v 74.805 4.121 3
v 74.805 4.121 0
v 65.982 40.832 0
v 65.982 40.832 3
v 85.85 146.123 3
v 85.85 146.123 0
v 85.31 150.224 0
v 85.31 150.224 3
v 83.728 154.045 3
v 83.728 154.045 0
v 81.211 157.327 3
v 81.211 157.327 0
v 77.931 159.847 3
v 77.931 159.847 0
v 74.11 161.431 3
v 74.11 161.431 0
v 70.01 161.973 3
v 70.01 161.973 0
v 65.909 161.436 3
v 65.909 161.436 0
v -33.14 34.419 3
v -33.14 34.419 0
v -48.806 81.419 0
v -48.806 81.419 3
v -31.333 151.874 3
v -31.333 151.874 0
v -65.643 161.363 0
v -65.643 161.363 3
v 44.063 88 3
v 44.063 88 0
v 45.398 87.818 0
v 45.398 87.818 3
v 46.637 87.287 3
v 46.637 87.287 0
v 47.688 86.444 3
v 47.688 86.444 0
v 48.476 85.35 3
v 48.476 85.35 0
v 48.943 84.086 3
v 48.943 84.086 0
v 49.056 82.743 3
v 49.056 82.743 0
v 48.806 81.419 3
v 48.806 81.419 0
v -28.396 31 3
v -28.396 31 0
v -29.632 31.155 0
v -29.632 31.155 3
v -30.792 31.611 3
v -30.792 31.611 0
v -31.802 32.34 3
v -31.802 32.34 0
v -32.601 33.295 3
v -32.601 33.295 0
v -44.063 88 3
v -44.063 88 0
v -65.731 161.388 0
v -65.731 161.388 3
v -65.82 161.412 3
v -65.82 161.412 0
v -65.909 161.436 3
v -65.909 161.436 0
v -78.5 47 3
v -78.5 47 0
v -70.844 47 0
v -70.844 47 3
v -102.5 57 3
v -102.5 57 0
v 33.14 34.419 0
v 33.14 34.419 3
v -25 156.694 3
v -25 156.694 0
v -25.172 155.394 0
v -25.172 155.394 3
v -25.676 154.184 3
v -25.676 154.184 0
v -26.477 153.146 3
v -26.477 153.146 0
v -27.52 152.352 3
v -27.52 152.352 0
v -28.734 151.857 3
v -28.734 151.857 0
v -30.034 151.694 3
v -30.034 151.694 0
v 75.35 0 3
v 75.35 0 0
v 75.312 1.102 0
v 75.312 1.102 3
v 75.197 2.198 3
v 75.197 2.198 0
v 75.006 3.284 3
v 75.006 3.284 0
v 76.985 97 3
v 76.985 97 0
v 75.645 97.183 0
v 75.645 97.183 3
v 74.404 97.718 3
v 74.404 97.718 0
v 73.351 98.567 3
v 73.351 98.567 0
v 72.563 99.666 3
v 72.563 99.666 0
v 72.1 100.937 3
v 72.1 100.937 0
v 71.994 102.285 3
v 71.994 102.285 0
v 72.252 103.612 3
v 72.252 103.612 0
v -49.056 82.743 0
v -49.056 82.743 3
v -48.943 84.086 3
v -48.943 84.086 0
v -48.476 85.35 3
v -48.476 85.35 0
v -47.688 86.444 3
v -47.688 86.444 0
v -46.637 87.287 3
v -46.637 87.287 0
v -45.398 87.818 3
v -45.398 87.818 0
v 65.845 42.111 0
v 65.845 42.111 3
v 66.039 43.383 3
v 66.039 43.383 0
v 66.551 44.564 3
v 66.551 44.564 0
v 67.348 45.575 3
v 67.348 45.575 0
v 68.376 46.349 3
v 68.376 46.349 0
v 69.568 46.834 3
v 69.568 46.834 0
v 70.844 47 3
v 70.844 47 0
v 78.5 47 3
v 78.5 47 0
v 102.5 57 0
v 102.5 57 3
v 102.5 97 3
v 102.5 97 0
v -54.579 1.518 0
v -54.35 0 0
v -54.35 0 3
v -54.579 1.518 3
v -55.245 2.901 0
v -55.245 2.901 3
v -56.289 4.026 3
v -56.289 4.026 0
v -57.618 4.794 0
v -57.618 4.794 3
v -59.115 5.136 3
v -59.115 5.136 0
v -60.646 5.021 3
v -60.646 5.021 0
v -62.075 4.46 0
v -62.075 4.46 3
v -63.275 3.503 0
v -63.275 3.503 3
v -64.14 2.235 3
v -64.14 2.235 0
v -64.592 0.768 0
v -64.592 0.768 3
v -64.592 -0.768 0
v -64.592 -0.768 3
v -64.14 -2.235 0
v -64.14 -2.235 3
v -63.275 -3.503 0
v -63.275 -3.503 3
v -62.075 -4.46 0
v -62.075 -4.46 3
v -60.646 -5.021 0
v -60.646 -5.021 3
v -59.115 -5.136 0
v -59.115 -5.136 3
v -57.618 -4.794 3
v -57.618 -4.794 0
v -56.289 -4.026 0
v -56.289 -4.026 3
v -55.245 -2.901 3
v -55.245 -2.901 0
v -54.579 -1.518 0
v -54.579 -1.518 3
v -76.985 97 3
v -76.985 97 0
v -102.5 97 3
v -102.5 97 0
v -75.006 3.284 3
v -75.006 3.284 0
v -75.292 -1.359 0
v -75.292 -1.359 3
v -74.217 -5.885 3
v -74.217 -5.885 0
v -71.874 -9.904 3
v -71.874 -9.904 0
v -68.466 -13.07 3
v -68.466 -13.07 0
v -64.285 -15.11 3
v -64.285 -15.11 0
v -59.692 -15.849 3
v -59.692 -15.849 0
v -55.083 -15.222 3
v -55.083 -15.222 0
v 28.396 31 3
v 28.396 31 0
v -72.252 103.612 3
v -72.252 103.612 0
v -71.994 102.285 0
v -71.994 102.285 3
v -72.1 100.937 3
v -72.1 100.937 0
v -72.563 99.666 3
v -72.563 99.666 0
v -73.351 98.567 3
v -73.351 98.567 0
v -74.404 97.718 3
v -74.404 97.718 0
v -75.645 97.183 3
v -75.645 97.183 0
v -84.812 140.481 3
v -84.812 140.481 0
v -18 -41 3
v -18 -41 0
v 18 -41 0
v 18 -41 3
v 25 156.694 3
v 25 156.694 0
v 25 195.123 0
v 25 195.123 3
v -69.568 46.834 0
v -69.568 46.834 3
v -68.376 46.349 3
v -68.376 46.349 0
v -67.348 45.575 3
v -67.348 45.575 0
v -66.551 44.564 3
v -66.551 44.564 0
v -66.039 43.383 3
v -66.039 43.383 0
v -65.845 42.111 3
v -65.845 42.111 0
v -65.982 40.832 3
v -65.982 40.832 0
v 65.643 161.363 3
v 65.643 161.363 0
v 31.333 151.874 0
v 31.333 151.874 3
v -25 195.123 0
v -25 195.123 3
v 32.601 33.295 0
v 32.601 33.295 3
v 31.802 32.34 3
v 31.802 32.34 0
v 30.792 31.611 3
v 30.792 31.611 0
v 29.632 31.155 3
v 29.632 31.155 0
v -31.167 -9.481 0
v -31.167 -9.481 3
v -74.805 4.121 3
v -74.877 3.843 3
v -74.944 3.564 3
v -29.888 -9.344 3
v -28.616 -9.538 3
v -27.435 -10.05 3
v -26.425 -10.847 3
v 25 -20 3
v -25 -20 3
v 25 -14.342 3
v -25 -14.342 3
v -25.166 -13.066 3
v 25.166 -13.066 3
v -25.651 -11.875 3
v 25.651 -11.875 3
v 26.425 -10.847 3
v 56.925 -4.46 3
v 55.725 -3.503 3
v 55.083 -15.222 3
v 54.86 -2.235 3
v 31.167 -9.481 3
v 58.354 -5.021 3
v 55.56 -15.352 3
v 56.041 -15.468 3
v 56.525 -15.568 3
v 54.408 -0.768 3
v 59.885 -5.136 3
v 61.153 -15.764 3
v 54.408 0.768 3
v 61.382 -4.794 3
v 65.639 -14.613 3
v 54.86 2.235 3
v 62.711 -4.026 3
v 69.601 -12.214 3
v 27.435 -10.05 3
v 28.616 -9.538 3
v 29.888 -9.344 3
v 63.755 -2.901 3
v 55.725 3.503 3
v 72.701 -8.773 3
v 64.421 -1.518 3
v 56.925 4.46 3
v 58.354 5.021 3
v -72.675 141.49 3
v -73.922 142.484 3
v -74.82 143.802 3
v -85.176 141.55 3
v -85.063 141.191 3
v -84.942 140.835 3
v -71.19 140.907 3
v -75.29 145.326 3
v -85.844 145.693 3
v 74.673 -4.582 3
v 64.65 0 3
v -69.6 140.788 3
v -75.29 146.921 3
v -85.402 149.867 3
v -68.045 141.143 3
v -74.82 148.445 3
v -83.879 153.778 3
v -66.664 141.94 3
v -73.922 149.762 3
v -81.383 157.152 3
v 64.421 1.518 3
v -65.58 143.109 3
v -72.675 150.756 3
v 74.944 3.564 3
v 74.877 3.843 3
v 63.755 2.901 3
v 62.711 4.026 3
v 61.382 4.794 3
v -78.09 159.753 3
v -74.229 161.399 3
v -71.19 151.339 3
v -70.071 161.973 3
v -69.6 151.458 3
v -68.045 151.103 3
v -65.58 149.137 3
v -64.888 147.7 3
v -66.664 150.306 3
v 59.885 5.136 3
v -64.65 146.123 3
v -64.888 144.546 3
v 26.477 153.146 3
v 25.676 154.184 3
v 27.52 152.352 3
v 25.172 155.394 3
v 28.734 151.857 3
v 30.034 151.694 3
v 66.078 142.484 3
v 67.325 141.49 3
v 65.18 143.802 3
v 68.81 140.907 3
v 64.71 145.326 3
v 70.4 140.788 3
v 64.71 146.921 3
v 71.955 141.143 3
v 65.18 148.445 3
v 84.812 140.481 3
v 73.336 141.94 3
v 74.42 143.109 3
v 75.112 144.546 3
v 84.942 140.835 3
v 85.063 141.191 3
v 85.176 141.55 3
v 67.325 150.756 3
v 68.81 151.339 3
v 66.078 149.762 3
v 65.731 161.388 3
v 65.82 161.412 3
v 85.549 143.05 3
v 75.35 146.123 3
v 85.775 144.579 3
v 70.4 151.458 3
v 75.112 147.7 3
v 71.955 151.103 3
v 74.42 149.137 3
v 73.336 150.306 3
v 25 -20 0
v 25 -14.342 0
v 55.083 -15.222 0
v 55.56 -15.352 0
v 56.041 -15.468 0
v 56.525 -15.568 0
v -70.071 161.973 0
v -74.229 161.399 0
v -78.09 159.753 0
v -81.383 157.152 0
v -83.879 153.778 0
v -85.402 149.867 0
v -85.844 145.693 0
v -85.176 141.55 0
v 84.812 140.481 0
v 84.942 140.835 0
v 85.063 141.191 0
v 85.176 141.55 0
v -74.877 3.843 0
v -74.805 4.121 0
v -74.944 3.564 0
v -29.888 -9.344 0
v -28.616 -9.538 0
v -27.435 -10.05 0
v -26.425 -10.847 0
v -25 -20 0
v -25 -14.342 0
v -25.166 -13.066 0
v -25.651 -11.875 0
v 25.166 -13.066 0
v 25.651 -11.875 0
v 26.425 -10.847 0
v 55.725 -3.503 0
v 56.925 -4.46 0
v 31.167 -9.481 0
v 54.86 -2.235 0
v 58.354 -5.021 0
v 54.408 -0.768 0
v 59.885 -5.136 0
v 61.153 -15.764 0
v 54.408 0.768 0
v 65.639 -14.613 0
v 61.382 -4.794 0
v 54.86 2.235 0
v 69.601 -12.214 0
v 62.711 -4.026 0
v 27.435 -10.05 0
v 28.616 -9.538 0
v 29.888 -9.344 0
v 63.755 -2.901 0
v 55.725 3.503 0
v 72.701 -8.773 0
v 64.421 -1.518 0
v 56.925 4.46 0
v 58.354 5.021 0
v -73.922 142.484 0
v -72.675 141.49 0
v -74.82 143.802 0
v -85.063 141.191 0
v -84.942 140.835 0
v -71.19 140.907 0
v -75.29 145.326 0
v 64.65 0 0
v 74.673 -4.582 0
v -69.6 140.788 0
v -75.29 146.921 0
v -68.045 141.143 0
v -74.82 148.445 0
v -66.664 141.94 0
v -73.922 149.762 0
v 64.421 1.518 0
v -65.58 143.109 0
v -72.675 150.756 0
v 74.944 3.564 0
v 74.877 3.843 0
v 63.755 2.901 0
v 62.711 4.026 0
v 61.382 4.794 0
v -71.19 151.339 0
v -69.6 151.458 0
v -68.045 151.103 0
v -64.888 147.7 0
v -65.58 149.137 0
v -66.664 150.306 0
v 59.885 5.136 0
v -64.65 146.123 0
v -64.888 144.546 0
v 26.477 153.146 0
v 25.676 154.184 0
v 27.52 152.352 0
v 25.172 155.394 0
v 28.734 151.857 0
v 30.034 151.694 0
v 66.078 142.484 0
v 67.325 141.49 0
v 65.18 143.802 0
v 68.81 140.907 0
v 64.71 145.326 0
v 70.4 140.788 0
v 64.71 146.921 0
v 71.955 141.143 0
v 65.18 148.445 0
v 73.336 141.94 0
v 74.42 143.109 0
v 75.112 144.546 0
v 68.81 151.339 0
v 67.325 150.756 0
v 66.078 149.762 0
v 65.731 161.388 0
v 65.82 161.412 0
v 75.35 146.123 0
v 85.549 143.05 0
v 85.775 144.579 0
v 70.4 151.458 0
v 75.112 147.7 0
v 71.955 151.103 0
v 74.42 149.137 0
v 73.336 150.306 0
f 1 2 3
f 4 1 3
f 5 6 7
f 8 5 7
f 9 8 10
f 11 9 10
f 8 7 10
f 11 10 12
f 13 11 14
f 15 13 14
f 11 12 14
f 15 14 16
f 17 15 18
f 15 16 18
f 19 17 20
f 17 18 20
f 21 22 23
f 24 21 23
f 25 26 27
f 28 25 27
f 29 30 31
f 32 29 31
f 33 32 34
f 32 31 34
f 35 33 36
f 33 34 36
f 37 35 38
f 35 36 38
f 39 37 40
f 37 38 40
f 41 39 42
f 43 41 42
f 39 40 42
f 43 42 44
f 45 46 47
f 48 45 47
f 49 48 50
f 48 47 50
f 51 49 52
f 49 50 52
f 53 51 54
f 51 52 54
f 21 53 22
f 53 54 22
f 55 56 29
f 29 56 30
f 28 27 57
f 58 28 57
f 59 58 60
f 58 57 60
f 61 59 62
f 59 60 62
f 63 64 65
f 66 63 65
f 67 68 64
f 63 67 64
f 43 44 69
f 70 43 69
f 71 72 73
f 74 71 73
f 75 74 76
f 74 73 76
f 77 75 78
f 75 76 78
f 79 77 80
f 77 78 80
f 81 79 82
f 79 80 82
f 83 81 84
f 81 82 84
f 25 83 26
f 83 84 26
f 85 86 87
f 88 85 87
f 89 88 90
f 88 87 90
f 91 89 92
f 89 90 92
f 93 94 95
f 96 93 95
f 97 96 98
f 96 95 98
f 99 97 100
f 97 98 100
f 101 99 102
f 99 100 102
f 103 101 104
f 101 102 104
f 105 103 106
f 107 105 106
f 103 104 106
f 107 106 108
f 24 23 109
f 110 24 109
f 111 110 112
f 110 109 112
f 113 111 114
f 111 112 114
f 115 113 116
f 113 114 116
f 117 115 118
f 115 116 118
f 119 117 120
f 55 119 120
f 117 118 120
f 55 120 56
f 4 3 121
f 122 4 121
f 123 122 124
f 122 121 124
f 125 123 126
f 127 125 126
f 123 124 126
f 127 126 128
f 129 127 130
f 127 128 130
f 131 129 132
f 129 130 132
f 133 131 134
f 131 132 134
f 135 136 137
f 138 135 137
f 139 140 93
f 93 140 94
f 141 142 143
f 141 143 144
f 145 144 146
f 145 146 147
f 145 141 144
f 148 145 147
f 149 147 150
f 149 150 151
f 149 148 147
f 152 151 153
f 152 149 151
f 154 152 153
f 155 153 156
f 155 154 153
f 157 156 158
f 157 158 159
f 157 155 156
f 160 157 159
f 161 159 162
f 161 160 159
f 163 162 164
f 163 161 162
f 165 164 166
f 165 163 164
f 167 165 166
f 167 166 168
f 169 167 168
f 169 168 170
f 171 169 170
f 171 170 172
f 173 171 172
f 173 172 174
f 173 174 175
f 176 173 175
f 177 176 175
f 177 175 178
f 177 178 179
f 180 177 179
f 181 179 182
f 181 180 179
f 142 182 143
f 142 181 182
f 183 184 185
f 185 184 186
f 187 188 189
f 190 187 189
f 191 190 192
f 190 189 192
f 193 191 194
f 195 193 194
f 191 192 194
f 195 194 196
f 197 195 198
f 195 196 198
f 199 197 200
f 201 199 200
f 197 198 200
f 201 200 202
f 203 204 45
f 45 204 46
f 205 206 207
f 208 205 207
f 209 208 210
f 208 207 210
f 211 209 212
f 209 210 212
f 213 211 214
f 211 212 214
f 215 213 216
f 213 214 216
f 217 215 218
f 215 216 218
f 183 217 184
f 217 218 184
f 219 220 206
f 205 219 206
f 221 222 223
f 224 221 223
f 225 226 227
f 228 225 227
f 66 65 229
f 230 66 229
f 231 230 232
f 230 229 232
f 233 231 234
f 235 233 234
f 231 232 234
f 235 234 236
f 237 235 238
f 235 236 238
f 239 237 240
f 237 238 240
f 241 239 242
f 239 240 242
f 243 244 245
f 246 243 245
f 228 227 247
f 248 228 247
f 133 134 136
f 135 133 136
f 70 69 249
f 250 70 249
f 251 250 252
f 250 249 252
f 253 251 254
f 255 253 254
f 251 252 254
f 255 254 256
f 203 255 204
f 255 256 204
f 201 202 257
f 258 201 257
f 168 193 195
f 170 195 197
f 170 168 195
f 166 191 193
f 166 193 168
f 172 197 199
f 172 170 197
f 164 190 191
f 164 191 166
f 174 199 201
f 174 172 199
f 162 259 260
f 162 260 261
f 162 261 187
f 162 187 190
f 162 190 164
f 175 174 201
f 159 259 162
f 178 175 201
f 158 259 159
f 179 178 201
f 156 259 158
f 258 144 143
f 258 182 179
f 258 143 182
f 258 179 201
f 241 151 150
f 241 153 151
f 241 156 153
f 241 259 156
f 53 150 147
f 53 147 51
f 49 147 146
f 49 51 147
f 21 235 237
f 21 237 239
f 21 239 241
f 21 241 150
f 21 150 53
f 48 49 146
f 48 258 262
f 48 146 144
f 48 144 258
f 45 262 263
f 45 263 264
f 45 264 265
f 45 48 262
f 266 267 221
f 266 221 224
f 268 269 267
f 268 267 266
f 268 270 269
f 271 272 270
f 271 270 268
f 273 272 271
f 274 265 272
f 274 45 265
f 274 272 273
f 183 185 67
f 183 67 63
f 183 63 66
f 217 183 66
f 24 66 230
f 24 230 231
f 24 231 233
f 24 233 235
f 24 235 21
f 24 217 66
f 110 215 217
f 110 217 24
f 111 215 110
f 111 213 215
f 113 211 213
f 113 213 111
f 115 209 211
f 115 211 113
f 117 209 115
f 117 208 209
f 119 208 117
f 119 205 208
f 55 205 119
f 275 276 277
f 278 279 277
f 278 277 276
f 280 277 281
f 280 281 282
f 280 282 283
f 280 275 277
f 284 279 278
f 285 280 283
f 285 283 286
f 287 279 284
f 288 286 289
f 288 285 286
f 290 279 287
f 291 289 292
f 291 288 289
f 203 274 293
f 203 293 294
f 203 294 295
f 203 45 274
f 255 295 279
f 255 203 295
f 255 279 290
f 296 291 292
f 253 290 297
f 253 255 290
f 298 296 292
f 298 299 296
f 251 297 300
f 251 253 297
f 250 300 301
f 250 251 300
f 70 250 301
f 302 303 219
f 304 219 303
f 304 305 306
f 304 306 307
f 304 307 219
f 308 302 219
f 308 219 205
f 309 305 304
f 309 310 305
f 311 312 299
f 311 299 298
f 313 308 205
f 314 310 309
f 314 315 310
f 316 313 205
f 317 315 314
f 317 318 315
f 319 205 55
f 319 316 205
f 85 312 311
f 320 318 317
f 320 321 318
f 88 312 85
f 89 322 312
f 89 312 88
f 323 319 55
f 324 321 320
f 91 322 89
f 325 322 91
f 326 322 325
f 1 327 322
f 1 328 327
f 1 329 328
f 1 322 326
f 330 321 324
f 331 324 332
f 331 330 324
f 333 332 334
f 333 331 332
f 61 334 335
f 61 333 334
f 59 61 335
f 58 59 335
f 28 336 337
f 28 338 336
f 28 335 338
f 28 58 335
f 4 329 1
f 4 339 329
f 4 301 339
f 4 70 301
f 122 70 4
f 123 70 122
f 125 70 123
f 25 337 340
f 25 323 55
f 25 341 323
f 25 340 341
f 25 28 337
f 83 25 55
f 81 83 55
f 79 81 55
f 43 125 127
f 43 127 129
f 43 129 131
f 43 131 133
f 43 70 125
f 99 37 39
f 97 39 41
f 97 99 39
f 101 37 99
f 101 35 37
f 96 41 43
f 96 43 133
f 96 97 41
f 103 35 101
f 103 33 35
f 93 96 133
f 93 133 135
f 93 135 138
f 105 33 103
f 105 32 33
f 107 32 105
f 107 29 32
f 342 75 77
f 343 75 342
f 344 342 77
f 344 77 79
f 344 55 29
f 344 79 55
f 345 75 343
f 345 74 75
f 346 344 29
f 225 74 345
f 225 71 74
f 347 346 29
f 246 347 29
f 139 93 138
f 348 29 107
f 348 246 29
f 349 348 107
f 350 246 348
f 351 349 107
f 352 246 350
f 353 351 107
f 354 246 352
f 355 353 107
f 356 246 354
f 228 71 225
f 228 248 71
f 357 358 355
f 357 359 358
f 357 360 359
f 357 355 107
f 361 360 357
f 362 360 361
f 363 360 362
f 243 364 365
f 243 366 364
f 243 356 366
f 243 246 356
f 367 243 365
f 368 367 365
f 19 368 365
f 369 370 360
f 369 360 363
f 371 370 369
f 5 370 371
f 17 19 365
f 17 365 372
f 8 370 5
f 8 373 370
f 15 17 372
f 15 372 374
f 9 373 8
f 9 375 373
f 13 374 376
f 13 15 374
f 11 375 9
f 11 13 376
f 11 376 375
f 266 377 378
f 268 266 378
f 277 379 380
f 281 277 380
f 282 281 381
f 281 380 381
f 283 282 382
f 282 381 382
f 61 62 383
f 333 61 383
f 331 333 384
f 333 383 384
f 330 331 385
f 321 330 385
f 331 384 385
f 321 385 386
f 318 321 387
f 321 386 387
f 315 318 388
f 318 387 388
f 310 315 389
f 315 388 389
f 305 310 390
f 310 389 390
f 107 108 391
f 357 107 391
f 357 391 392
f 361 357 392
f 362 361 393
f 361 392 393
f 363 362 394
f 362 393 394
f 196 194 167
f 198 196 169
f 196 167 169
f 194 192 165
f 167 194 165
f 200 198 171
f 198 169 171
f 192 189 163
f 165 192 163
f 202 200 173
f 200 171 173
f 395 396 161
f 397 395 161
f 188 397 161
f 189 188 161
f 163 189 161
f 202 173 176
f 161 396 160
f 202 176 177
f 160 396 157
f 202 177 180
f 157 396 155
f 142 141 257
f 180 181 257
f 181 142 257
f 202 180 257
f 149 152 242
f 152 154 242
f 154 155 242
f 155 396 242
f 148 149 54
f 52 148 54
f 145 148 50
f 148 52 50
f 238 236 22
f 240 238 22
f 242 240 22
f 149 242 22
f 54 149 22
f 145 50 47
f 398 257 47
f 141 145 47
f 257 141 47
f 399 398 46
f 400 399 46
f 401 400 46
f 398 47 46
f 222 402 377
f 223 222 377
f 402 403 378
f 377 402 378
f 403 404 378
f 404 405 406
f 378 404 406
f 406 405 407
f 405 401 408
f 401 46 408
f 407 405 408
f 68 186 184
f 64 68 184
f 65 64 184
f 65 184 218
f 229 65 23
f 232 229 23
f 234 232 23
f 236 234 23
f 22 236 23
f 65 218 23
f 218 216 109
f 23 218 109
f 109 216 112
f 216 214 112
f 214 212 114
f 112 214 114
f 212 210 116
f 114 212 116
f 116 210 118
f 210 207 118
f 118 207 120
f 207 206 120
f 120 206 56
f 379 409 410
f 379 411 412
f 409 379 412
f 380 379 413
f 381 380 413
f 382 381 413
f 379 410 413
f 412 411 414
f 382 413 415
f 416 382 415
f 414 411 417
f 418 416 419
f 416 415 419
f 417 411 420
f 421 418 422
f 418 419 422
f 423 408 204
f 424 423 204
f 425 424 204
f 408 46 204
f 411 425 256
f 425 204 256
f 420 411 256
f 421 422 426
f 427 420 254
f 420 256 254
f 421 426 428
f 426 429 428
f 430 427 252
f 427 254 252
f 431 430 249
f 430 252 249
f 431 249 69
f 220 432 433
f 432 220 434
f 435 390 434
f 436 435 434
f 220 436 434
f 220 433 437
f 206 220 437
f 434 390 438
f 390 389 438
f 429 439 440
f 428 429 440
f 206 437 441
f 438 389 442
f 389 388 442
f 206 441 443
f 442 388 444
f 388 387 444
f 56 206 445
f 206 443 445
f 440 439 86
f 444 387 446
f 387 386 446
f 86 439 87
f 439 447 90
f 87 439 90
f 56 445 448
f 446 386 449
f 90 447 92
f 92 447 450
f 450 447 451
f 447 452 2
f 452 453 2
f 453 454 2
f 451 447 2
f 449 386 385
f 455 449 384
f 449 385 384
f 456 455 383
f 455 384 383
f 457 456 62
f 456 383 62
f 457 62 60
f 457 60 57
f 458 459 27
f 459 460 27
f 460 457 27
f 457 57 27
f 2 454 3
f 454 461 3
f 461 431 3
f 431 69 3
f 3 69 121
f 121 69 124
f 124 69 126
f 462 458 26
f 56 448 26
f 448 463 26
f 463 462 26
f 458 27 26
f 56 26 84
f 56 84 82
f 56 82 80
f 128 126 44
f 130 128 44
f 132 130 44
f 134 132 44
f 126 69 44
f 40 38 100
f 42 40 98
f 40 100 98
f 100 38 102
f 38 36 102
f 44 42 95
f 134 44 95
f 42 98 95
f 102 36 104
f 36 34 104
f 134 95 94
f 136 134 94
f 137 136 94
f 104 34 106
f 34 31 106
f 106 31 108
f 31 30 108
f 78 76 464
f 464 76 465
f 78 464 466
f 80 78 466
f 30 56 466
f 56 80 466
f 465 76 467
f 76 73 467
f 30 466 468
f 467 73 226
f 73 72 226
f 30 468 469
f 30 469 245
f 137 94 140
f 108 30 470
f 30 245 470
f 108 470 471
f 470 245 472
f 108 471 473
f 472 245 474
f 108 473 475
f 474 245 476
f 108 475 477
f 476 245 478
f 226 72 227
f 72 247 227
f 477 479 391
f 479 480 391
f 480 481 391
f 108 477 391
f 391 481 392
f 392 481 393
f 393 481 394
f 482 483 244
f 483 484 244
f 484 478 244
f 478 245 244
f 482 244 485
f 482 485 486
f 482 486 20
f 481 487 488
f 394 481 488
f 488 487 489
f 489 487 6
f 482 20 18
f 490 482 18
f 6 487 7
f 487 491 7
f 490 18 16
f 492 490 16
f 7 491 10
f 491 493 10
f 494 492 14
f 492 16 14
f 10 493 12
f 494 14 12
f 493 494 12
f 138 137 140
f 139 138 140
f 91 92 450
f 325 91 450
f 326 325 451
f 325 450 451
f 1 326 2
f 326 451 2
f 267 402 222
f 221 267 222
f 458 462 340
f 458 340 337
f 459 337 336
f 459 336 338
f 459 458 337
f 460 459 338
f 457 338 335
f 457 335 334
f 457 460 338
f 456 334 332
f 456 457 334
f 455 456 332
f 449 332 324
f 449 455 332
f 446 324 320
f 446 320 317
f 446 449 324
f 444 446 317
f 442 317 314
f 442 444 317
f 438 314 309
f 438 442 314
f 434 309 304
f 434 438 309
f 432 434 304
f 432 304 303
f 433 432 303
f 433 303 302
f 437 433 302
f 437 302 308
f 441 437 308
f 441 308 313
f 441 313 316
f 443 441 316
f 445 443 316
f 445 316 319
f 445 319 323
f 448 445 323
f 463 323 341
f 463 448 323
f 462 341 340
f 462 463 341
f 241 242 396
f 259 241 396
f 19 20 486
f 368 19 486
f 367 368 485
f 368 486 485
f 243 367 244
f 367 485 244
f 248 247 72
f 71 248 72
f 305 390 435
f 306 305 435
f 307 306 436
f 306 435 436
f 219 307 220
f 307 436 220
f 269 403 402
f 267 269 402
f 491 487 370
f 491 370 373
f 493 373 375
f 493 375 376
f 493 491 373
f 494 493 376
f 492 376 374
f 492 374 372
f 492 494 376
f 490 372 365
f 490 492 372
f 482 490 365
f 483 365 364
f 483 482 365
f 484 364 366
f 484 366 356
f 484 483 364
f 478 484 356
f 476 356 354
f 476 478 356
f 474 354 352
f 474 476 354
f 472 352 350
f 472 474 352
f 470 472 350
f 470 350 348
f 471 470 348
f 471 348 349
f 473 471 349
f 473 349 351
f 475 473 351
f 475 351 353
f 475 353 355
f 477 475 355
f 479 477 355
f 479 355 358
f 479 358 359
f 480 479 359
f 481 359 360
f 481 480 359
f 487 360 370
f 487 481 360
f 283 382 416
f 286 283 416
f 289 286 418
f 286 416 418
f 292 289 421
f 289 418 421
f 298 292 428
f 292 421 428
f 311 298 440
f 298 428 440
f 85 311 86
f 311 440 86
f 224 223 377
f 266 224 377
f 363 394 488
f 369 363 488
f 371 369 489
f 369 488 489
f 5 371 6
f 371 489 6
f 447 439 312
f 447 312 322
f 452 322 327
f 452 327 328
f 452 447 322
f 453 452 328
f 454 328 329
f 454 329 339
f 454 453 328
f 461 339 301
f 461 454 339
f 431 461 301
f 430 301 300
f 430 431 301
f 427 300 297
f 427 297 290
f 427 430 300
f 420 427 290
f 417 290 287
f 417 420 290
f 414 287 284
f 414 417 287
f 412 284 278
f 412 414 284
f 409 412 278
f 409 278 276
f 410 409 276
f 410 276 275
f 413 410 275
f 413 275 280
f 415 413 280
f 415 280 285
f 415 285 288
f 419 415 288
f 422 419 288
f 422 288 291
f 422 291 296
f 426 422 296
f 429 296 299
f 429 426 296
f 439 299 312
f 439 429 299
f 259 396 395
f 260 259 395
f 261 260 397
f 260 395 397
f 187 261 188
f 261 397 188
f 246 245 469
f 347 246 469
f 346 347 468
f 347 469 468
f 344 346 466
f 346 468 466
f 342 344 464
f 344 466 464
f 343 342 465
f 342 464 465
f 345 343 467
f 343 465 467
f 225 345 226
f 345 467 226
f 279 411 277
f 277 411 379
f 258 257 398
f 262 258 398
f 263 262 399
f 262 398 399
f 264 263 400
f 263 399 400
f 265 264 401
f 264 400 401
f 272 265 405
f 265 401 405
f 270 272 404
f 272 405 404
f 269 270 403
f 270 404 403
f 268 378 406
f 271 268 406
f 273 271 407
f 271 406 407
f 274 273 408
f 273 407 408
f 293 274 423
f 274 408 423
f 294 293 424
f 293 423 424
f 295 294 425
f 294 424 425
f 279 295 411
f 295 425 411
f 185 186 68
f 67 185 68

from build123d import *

# Parameters (mm, degrees)
F0_R     = 5.15
F0_R_2   = 5.35
F1_DEPTH = 3
F2_DEPTH = 3


# Not quite as in the source:
# - a feature names something its author has since deleted; it is built from what else it names


with BuildPart() as f1:
    # F0 (on Top) → F1 (new body)
    with BuildSketch(Plane.XY):
        with BuildLine():
            Line((-25, -20), (0, -20))
            Line((0, -20), (25, -20))
            Line((25, -20), (25, -14.3424324172))
            ThreePointArc((25, -14.3424324172), (26.9045190123, -10.4158566246), (31.167198982, -9.4805761322))
            Line((31.167198982, -9.4805761322), (55.0829571834, -15.2220968581))
            ThreePointArc((55.0829571834, -15.2220968581), (48.4016498049, 11.3158792388), (74.8049560197, 4.1207792025))
            Line((74.8049560197, 4.1207792025), (65.9824120319, 40.8316405516))
            ThreePointArc((65.9824120319, 40.8316405516), (66.917044372, 45.0950123391), (70.8439895742, 47))
            Line((70.8439895742, 47), (78.5, 47))
            Line((78.5, 47), (102.5, 57))
            Line((102.5, 57), (102.5, 97))
            Line((102.5, 97), (78.5, 97))
            Line((78.5, 97), (76.9853890649, 97))
            ThreePointArc((76.9853890649, 97), (72.9195967319, 99.0897882028), (72.2524623398, 103.6122669181))
            Line((72.2524623398, 103.6122669181), (84.8119254692, 140.4814838147))
            ThreePointArc((84.8119254692, 140.4814838147), (58.3240216641, 135.4043723862), (65.6425820254, 161.362507579))
            Line((65.6425820254, 161.362507579), (31.3326776693, 151.8744700251))
            ThreePointArc((31.3326776693, 151.8744700251), (26.9720789596, 152.7146893354), (25, 156.6935954883))
            Line((25, 156.6935954883), (25, 195.1232356609))
            Line((25, 195.1232356609), (0, 195.1232356609))
            Line((0, 195.1232356609), (-25, 195.1232356609))
            Line((-25, 195.1232356609), (-25, 156.6935954883))
            ThreePointArc((-25, 156.6935954883), (-26.9720789596, 152.7146893354), (-31.3326776693, 151.8744700251))
            Line((-31.3326776693, 151.8744700251), (-65.6425820254, 161.362507579))
            ThreePointArc((-65.6425820254, 161.362507579), (-57.3452069377, 155.666752442), (-54.15, 146.1232356609))
            ThreePointArc((-54.15, 146.1232356609), (-67.1317704666, 130.5349144124), (-84.8119254692, 140.4814838147))
            Line((-84.8119254692, 140.4814838147), (-72.2524623398, 103.6122669181))
            ThreePointArc((-72.2524623398, 103.6122669181), (-72.9195967319, 99.0897882028), (-76.9853890649, 97))
            Line((-76.9853890649, 97), (-78.5, 97))
            Line((-78.5, 97), (-102.5, 97))
            Line((-102.5, 97), (-102.5, 57))
            Line((-102.5, 57), (-78.5, 47))
            Line((-78.5, 47), (-70.8439895742, 47))
            ThreePointArc((-70.8439895742, 47), (-66.917044372, 45.0950123391), (-65.9824120319, 40.8316405516))
            Line((-65.9824120319, 40.8316405516), (-74.8049560197, 4.1207792025))
            ThreePointArc((-74.8049560197, 4.1207792025), (-57.4216656804, 15.7131482032), (-43.65, 0))
            ThreePointArc((-43.65, 0), (-46.826550812, -9.5187281545), (-55.0829571834, -15.2220968581))
            Line((-55.0829571834, -15.2220968581), (-31.167198982, -9.4805761322))
            ThreePointArc((-31.167198982, -9.4805761322), (-26.9045190123, -10.4158566246), (-25, -14.3424324172))
            Line((-25, -14.3424324172), (-25, -20))
        make_face()
        with BuildLine():
            Line((28.3962038997, 31), (0, 31))
            Line((0, 31), (-28.3962038997, 31))
            ThreePointArc((-28.3962038997, 31), (-31.319755323, 31.9437890741), (-33.13962039, 34.4188611699))
            Line((-33.13962039, 34.4188611699), (-48.8062870566, 81.4188611699))
            ThreePointArc((-48.8062870566, 81.4188611699), (-48.1190814923, 85.9235514233), (-44.0628705664, 88))
            Line((-44.0628705664, 88), (0, 88))
            Line((0, 88), (44.0628705664, 88))
            ThreePointArc((44.0628705664, 88), (48.1190814923, 85.9235514233), (48.8062870566, 81.4188611699))
            Line((48.8062870566, 81.4188611699), (33.13962039, 34.4188611699))
            ThreePointArc((33.13962039, 34.4188611699), (31.319755323, 31.9437890741), (28.3962038997, 31))
        make_face(mode=Mode.SUBTRACT)
        Polygon((25, -20), (0, -20), (-25, -20), (-18, -41), (0, -41), (18, -41), align=None)
        with BuildLine():
            ThreePointArc((74.8049560197, 4.1207792025), (48.4016498049, 11.3158792388), (55.0829571834, -15.2220968581))
            Line((55.0829571834, -15.2220968581), (56.5251048848, -15.5683171555))
            Line((56.5251048848, -15.5683171555), (75.0060818693, 3.2838887103))
            Line((75.0060818693, 3.2838887103), (74.8049560197, 4.1207792025))
        make_face()
        with Locations((59.5, 0)):
            Circle(F0_R, mode=Mode.SUBTRACT)
        with BuildLine():
            Line((56.5251048848, -15.5683171555), (55.0829571834, -15.2220968581))
            ThreePointArc((55.0829571834, -15.2220968581), (55.799979227, -15.4120844236), (56.5251048848, -15.5683171555))
        make_face()
        with BuildLine():
            Line((-56.5251048848, -15.5683171555), (-55.0829571834, -15.2220968581))
            ThreePointArc((-55.0829571834, -15.2220968581), (-46.826550812, -9.5187281545), (-43.65, 0))
            ThreePointArc((-43.65, 0), (-57.4216656804, 15.7131482032), (-74.8049560197, 4.1207792025))
            Line((-74.8049560197, 4.1207792025), (-75.0060818693, 3.2838887103))
            Line((-75.0060818693, 3.2838887103), (-56.5251048848, -15.5683171555))
        make_face()
        with Locations((-59.5, 0)):
            Circle(F0_R, mode=Mode.SUBTRACT)
        with BuildLine():
            ThreePointArc((-56.5251048848, -15.5683171555), (-55.799979227, -15.4120844236), (-55.0829571834, -15.2220968581))
            Line((-55.0829571834, -15.2220968581), (-56.5251048848, -15.5683171555))
        make_face()
        with BuildLine():
            Line((75.0060818693, 3.2838887103), (56.5251048848, -15.5683171555))
            ThreePointArc((56.5251048848, -15.5683171555), (69.6012477552, -12.2142250588), (75.35, 0))
            ThreePointArc((75.35, 0), (75.2637859924, 1.6509243428), (75.0060818693, 3.2838887103))
        make_face()
        with BuildLine():
            ThreePointArc((75.0060818693, 3.2838887103), (74.9112008089, 3.7036994515), (74.8049560197, 4.1207792025))
            Line((74.8049560197, 4.1207792025), (75.0060818693, 3.2838887103))
        make_face()
        with BuildLine():
            ThreePointArc((-75.0060818693, 3.2838887103), (-70.8185280345, -11.0956488378), (-56.5251048848, -15.5683171555))
            Line((-56.5251048848, -15.5683171555), (-75.0060818693, 3.2838887103))
        make_face()
        with BuildLine():
            ThreePointArc((-74.8049560197, 4.1207792025), (-74.9112008089, 3.7036994515), (-75.0060818693, 3.2838887103))
            Line((-75.0060818693, 3.2838887103), (-74.8049560197, 4.1207792025))
        make_face()
        with BuildLine():
            ThreePointArc((65.6425820254, 161.362507579), (58.3240216641, 135.4043723862), (84.8119254692, 140.4814838147))
            Line((84.8119254692, 140.4814838147), (85.1758103286, 141.5496942681))
            Line((85.1758103286, 141.5496942681), (65.9085617168, 161.4360614215))
            Line((65.9085617168, 161.4360614215), (65.6425820254, 161.362507579))
        make_face()
        with Locations((70, 146.1232356609)):
            Circle(F0_R_2, mode=Mode.SUBTRACT)
        with BuildLine():
            Line((85.1758103286, 141.5496942681), (84.8119254692, 140.4814838147))
            ThreePointArc((84.8119254692, 140.4814838147), (85.0033777185, 141.0123495306), (85.1758103286, 141.5496942681))
        make_face()
        with BuildLine():
            Line((65.9085617168, 161.4360614215), (85.1758103286, 141.5496942681))
            ThreePointArc((85.1758103286, 141.5496942681), (85.6805467651, 143.8117527719), (85.85, 146.1232356609))
            ThreePointArc((85.85, 146.1232356609), (79.6533207553, 158.6944686312), (65.9085617168, 161.4360614215))
        make_face()
        with BuildLine():
            ThreePointArc((65.9085617168, 161.4360614215), (65.7754117883, 161.3998633791), (65.6425820254, 161.362507579))
            Line((65.6425820254, 161.362507579), (65.9085617168, 161.4360614215))
        make_face()
        with BuildLine():
            ThreePointArc((-85.1758103286, 141.5496942681), (-85.0033777185, 141.0123495306), (-84.8119254692, 140.4814838147))
            Line((-84.8119254692, 140.4814838147), (-85.1758103286, 141.5496942681))
        make_face()
        with BuildLine():
            Line((-85.1758103286, 141.5496942681), (-84.8119254692, 140.4814838147))
            ThreePointArc((-84.8119254692, 140.4814838147), (-67.1317704666, 130.5349144124), (-54.15, 146.1232356609))
            ThreePointArc((-54.15, 146.1232356609), (-57.3452069377, 155.666752442), (-65.6425820254, 161.362507579))
            Line((-65.6425820254, 161.362507579), (-65.9085617168, 161.4360614215))
            Line((-65.9085617168, 161.4360614215), (-85.1758103286, 141.5496942681))
        make_face()
        with Locations((-70, 146.1232356609)):
            Circle(F0_R_2, mode=Mode.SUBTRACT)
        with BuildLine():
            ThreePointArc((-65.9085617168, 161.4360614215), (-81.3834408484, 157.1522779788), (-85.1758103286, 141.5496942681))
            Line((-85.1758103286, 141.5496942681), (-65.9085617168, 161.4360614215))
        make_face()
        with BuildLine():
            ThreePointArc((-65.6425820254, 161.362507579), (-65.7754117883, 161.3998633791), (-65.9085617168, 161.4360614215))
            Line((-65.9085617168, 161.4360614215), (-65.6425820254, 161.362507579))
        make_face()
    extrude(amount=F1_DEPTH)

    # F0 (on Top) → F2 (join)
    with BuildSketch(Plane.XY):
        with BuildLine():
            Line((-25, -20), (0, -20))
            Line((0, -20), (25, -20))
            Line((25, -20), (25, -14.3424324172))
            ThreePointArc((25, -14.3424324172), (26.9045190123, -10.4158566246), (31.167198982, -9.4805761322))
            Line((31.167198982, -9.4805761322), (55.0829571834, -15.2220968581))
            ThreePointArc((55.0829571834, -15.2220968581), (48.4016498049, 11.3158792388), (74.8049560197, 4.1207792025))
            Line((74.8049560197, 4.1207792025), (65.9824120319, 40.8316405516))
            ThreePointArc((65.9824120319, 40.8316405516), (66.917044372, 45.0950123391), (70.8439895742, 47))
            Line((70.8439895742, 47), (78.5, 47))
            Line((78.5, 47), (102.5, 57))
            Line((102.5, 57), (102.5, 97))
            Line((102.5, 97), (78.5, 97))
            Line((78.5, 97), (76.9853890649, 97))
            ThreePointArc((76.9853890649, 97), (72.9195967319, 99.0897882028), (72.2524623398, 103.6122669181))
            Line((72.2524623398, 103.6122669181), (84.8119254692, 140.4814838147))
            ThreePointArc((84.8119254692, 140.4814838147), (58.3240216641, 135.4043723862), (65.6425820254, 161.362507579))
            Line((65.6425820254, 161.362507579), (31.3326776693, 151.8744700251))
            ThreePointArc((31.3326776693, 151.8744700251), (26.9720789596, 152.7146893354), (25, 156.6935954883))
            Line((25, 156.6935954883), (25, 195.1232356609))
            Line((25, 195.1232356609), (0, 195.1232356609))
            Line((0, 195.1232356609), (-25, 195.1232356609))
            Line((-25, 195.1232356609), (-25, 156.6935954883))
            ThreePointArc((-25, 156.6935954883), (-26.9720789596, 152.7146893354), (-31.3326776693, 151.8744700251))
            Line((-31.3326776693, 151.8744700251), (-65.6425820254, 161.362507579))
            ThreePointArc((-65.6425820254, 161.362507579), (-57.3452069377, 155.666752442), (-54.15, 146.1232356609))
            ThreePointArc((-54.15, 146.1232356609), (-67.1317704666, 130.5349144124), (-84.8119254692, 140.4814838147))
            Line((-84.8119254692, 140.4814838147), (-72.2524623398, 103.6122669181))
            ThreePointArc((-72.2524623398, 103.6122669181), (-72.9195967319, 99.0897882028), (-76.9853890649, 97))
            Line((-76.9853890649, 97), (-78.5, 97))
            Line((-78.5, 97), (-102.5, 97))
            Line((-102.5, 97), (-102.5, 57))
            Line((-102.5, 57), (-78.5, 47))
            Line((-78.5, 47), (-70.8439895742, 47))
            ThreePointArc((-70.8439895742, 47), (-66.917044372, 45.0950123391), (-65.9824120319, 40.8316405516))
            Line((-65.9824120319, 40.8316405516), (-74.8049560197, 4.1207792025))
            ThreePointArc((-74.8049560197, 4.1207792025), (-57.4216656804, 15.7131482032), (-43.65, 0))
            ThreePointArc((-43.65, 0), (-46.826550812, -9.5187281545), (-55.0829571834, -15.2220968581))
            Line((-55.0829571834, -15.2220968581), (-31.167198982, -9.4805761322))
            ThreePointArc((-31.167198982, -9.4805761322), (-26.9045190123, -10.4158566246), (-25, -14.3424324172))
            Line((-25, -14.3424324172), (-25, -20))
        make_face()
        with BuildLine():
            Line((28.3962038997, 31), (0, 31))
            Line((0, 31), (-28.3962038997, 31))
            ThreePointArc((-28.3962038997, 31), (-31.319755323, 31.9437890741), (-33.13962039, 34.4188611699))
            Line((-33.13962039, 34.4188611699), (-48.8062870566, 81.4188611699))
            ThreePointArc((-48.8062870566, 81.4188611699), (-48.1190814923, 85.9235514233), (-44.0628705664, 88))
            Line((-44.0628705664, 88), (0, 88))
            Line((0, 88), (44.0628705664, 88))
            ThreePointArc((44.0628705664, 88), (48.1190814923, 85.9235514233), (48.8062870566, 81.4188611699))
            Line((48.8062870566, 81.4188611699), (33.13962039, 34.4188611699))
            ThreePointArc((33.13962039, 34.4188611699), (31.319755323, 31.9437890741), (28.3962038997, 31))
        make_face(mode=Mode.SUBTRACT)
        Polygon((25, -20), (0, -20), (-25, -20), (-18, -41), (0, -41), (18, -41), align=None)
        with BuildLine():
            ThreePointArc((74.8049560197, 4.1207792025), (48.4016498049, 11.3158792388), (55.0829571834, -15.2220968581))
            Line((55.0829571834, -15.2220968581), (56.5251048848, -15.5683171555))
            Line((56.5251048848, -15.5683171555), (75.0060818693, 3.2838887103))
            Line((75.0060818693, 3.2838887103), (74.8049560197, 4.1207792025))
        make_face()
        with Locations((59.5, 0)):
            Circle(F0_R, mode=Mode.SUBTRACT)
        with BuildLine():
            Line((56.5251048848, -15.5683171555), (55.0829571834, -15.2220968581))
            ThreePointArc((55.0829571834, -15.2220968581), (55.799979227, -15.4120844236), (56.5251048848, -15.5683171555))
        make_face()
        with BuildLine():
            Line((-56.5251048848, -15.5683171555), (-55.0829571834, -15.2220968581))
            ThreePointArc((-55.0829571834, -15.2220968581), (-46.826550812, -9.5187281545), (-43.65, 0))
            ThreePointArc((-43.65, 0), (-57.4216656804, 15.7131482032), (-74.8049560197, 4.1207792025))
            Line((-74.8049560197, 4.1207792025), (-75.0060818693, 3.2838887103))
            Line((-75.0060818693, 3.2838887103), (-56.5251048848, -15.5683171555))
        make_face()
        with Locations((-59.5, 0)):
            Circle(F0_R, mode=Mode.SUBTRACT)
        with BuildLine():
            ThreePointArc((-56.5251048848, -15.5683171555), (-55.799979227, -15.4120844236), (-55.0829571834, -15.2220968581))
            Line((-55.0829571834, -15.2220968581), (-56.5251048848, -15.5683171555))
        make_face()
        with BuildLine():
            Line((75.0060818693, 3.2838887103), (56.5251048848, -15.5683171555))
            ThreePointArc((56.5251048848, -15.5683171555), (69.6012477552, -12.2142250588), (75.35, 0))
            ThreePointArc((75.35, 0), (75.2637859924, 1.6509243428), (75.0060818693, 3.2838887103))
        make_face()
        with BuildLine():
            ThreePointArc((75.0060818693, 3.2838887103), (74.9112008089, 3.7036994515), (74.8049560197, 4.1207792025))
            Line((74.8049560197, 4.1207792025), (75.0060818693, 3.2838887103))
        make_face()
        with BuildLine():
            ThreePointArc((-75.0060818693, 3.2838887103), (-70.8185280345, -11.0956488378), (-56.5251048848, -15.5683171555))
            Line((-56.5251048848, -15.5683171555), (-75.0060818693, 3.2838887103))
        make_face()
        with BuildLine():
            ThreePointArc((-74.8049560197, 4.1207792025), (-74.9112008089, 3.7036994515), (-75.0060818693, 3.2838887103))
            Line((-75.0060818693, 3.2838887103), (-74.8049560197, 4.1207792025))
        make_face()
        with BuildLine():
            ThreePointArc((65.6425820254, 161.362507579), (58.3240216641, 135.4043723862), (84.8119254692, 140.4814838147))
            Line((84.8119254692, 140.4814838147), (85.1758103286, 141.5496942681))
            Line((85.1758103286, 141.5496942681), (65.9085617168, 161.4360614215))
            Line((65.9085617168, 161.4360614215), (65.6425820254, 161.362507579))
        make_face()
        with Locations((70, 146.1232356609)):
            Circle(F0_R_2, mode=Mode.SUBTRACT)
        with BuildLine():
            Line((85.1758103286, 141.5496942681), (84.8119254692, 140.4814838147))
            ThreePointArc((84.8119254692, 140.4814838147), (85.0033777185, 141.0123495306), (85.1758103286, 141.5496942681))
        make_face()
        with BuildLine():
            Line((65.9085617168, 161.4360614215), (85.1758103286, 141.5496942681))
            ThreePointArc((85.1758103286, 141.5496942681), (85.6805467651, 143.8117527719), (85.85, 146.1232356609))
            ThreePointArc((85.85, 146.1232356609), (79.6533207553, 158.6944686312), (65.9085617168, 161.4360614215))
        make_face()
        with BuildLine():
            ThreePointArc((65.9085617168, 161.4360614215), (65.7754117883, 161.3998633791), (65.6425820254, 161.362507579))
            Line((65.6425820254, 161.362507579), (65.9085617168, 161.4360614215))
        make_face()
        with BuildLine():
            ThreePointArc((-85.1758103286, 141.5496942681), (-85.0033777185, 141.0123495306), (-84.8119254692, 140.4814838147))
            Line((-84.8119254692, 140.4814838147), (-85.1758103286, 141.5496942681))
        make_face()
        with BuildLine():
            Line((-85.1758103286, 141.5496942681), (-84.8119254692, 140.4814838147))
            ThreePointArc((-84.8119254692, 140.4814838147), (-67.1317704666, 130.5349144124), (-54.15, 146.1232356609))
            ThreePointArc((-54.15, 146.1232356609), (-57.3452069377, 155.666752442), (-65.6425820254, 161.362507579))
            Line((-65.6425820254, 161.362507579), (-65.9085617168, 161.4360614215))
            Line((-65.9085617168, 161.4360614215), (-85.1758103286, 141.5496942681))
        make_face()
        with Locations((-70, 146.1232356609)):
            Circle(F0_R_2, mode=Mode.SUBTRACT)
        with BuildLine():
            ThreePointArc((-65.9085617168, 161.4360614215), (-81.3834408484, 157.1522779788), (-85.1758103286, 141.5496942681))
            Line((-85.1758103286, 141.5496942681), (-65.9085617168, 161.4360614215))
        make_face()
        with BuildLine():
            ThreePointArc((-65.6425820254, 161.362507579), (-65.7754117883, 161.3998633791), (-65.9085617168, 161.4360614215))
            Line((-65.9085617168, 161.4360614215), (-65.6425820254, 161.362507579))
        make_face()
    extrude(amount=F2_DEPTH)


solid = f1.part
